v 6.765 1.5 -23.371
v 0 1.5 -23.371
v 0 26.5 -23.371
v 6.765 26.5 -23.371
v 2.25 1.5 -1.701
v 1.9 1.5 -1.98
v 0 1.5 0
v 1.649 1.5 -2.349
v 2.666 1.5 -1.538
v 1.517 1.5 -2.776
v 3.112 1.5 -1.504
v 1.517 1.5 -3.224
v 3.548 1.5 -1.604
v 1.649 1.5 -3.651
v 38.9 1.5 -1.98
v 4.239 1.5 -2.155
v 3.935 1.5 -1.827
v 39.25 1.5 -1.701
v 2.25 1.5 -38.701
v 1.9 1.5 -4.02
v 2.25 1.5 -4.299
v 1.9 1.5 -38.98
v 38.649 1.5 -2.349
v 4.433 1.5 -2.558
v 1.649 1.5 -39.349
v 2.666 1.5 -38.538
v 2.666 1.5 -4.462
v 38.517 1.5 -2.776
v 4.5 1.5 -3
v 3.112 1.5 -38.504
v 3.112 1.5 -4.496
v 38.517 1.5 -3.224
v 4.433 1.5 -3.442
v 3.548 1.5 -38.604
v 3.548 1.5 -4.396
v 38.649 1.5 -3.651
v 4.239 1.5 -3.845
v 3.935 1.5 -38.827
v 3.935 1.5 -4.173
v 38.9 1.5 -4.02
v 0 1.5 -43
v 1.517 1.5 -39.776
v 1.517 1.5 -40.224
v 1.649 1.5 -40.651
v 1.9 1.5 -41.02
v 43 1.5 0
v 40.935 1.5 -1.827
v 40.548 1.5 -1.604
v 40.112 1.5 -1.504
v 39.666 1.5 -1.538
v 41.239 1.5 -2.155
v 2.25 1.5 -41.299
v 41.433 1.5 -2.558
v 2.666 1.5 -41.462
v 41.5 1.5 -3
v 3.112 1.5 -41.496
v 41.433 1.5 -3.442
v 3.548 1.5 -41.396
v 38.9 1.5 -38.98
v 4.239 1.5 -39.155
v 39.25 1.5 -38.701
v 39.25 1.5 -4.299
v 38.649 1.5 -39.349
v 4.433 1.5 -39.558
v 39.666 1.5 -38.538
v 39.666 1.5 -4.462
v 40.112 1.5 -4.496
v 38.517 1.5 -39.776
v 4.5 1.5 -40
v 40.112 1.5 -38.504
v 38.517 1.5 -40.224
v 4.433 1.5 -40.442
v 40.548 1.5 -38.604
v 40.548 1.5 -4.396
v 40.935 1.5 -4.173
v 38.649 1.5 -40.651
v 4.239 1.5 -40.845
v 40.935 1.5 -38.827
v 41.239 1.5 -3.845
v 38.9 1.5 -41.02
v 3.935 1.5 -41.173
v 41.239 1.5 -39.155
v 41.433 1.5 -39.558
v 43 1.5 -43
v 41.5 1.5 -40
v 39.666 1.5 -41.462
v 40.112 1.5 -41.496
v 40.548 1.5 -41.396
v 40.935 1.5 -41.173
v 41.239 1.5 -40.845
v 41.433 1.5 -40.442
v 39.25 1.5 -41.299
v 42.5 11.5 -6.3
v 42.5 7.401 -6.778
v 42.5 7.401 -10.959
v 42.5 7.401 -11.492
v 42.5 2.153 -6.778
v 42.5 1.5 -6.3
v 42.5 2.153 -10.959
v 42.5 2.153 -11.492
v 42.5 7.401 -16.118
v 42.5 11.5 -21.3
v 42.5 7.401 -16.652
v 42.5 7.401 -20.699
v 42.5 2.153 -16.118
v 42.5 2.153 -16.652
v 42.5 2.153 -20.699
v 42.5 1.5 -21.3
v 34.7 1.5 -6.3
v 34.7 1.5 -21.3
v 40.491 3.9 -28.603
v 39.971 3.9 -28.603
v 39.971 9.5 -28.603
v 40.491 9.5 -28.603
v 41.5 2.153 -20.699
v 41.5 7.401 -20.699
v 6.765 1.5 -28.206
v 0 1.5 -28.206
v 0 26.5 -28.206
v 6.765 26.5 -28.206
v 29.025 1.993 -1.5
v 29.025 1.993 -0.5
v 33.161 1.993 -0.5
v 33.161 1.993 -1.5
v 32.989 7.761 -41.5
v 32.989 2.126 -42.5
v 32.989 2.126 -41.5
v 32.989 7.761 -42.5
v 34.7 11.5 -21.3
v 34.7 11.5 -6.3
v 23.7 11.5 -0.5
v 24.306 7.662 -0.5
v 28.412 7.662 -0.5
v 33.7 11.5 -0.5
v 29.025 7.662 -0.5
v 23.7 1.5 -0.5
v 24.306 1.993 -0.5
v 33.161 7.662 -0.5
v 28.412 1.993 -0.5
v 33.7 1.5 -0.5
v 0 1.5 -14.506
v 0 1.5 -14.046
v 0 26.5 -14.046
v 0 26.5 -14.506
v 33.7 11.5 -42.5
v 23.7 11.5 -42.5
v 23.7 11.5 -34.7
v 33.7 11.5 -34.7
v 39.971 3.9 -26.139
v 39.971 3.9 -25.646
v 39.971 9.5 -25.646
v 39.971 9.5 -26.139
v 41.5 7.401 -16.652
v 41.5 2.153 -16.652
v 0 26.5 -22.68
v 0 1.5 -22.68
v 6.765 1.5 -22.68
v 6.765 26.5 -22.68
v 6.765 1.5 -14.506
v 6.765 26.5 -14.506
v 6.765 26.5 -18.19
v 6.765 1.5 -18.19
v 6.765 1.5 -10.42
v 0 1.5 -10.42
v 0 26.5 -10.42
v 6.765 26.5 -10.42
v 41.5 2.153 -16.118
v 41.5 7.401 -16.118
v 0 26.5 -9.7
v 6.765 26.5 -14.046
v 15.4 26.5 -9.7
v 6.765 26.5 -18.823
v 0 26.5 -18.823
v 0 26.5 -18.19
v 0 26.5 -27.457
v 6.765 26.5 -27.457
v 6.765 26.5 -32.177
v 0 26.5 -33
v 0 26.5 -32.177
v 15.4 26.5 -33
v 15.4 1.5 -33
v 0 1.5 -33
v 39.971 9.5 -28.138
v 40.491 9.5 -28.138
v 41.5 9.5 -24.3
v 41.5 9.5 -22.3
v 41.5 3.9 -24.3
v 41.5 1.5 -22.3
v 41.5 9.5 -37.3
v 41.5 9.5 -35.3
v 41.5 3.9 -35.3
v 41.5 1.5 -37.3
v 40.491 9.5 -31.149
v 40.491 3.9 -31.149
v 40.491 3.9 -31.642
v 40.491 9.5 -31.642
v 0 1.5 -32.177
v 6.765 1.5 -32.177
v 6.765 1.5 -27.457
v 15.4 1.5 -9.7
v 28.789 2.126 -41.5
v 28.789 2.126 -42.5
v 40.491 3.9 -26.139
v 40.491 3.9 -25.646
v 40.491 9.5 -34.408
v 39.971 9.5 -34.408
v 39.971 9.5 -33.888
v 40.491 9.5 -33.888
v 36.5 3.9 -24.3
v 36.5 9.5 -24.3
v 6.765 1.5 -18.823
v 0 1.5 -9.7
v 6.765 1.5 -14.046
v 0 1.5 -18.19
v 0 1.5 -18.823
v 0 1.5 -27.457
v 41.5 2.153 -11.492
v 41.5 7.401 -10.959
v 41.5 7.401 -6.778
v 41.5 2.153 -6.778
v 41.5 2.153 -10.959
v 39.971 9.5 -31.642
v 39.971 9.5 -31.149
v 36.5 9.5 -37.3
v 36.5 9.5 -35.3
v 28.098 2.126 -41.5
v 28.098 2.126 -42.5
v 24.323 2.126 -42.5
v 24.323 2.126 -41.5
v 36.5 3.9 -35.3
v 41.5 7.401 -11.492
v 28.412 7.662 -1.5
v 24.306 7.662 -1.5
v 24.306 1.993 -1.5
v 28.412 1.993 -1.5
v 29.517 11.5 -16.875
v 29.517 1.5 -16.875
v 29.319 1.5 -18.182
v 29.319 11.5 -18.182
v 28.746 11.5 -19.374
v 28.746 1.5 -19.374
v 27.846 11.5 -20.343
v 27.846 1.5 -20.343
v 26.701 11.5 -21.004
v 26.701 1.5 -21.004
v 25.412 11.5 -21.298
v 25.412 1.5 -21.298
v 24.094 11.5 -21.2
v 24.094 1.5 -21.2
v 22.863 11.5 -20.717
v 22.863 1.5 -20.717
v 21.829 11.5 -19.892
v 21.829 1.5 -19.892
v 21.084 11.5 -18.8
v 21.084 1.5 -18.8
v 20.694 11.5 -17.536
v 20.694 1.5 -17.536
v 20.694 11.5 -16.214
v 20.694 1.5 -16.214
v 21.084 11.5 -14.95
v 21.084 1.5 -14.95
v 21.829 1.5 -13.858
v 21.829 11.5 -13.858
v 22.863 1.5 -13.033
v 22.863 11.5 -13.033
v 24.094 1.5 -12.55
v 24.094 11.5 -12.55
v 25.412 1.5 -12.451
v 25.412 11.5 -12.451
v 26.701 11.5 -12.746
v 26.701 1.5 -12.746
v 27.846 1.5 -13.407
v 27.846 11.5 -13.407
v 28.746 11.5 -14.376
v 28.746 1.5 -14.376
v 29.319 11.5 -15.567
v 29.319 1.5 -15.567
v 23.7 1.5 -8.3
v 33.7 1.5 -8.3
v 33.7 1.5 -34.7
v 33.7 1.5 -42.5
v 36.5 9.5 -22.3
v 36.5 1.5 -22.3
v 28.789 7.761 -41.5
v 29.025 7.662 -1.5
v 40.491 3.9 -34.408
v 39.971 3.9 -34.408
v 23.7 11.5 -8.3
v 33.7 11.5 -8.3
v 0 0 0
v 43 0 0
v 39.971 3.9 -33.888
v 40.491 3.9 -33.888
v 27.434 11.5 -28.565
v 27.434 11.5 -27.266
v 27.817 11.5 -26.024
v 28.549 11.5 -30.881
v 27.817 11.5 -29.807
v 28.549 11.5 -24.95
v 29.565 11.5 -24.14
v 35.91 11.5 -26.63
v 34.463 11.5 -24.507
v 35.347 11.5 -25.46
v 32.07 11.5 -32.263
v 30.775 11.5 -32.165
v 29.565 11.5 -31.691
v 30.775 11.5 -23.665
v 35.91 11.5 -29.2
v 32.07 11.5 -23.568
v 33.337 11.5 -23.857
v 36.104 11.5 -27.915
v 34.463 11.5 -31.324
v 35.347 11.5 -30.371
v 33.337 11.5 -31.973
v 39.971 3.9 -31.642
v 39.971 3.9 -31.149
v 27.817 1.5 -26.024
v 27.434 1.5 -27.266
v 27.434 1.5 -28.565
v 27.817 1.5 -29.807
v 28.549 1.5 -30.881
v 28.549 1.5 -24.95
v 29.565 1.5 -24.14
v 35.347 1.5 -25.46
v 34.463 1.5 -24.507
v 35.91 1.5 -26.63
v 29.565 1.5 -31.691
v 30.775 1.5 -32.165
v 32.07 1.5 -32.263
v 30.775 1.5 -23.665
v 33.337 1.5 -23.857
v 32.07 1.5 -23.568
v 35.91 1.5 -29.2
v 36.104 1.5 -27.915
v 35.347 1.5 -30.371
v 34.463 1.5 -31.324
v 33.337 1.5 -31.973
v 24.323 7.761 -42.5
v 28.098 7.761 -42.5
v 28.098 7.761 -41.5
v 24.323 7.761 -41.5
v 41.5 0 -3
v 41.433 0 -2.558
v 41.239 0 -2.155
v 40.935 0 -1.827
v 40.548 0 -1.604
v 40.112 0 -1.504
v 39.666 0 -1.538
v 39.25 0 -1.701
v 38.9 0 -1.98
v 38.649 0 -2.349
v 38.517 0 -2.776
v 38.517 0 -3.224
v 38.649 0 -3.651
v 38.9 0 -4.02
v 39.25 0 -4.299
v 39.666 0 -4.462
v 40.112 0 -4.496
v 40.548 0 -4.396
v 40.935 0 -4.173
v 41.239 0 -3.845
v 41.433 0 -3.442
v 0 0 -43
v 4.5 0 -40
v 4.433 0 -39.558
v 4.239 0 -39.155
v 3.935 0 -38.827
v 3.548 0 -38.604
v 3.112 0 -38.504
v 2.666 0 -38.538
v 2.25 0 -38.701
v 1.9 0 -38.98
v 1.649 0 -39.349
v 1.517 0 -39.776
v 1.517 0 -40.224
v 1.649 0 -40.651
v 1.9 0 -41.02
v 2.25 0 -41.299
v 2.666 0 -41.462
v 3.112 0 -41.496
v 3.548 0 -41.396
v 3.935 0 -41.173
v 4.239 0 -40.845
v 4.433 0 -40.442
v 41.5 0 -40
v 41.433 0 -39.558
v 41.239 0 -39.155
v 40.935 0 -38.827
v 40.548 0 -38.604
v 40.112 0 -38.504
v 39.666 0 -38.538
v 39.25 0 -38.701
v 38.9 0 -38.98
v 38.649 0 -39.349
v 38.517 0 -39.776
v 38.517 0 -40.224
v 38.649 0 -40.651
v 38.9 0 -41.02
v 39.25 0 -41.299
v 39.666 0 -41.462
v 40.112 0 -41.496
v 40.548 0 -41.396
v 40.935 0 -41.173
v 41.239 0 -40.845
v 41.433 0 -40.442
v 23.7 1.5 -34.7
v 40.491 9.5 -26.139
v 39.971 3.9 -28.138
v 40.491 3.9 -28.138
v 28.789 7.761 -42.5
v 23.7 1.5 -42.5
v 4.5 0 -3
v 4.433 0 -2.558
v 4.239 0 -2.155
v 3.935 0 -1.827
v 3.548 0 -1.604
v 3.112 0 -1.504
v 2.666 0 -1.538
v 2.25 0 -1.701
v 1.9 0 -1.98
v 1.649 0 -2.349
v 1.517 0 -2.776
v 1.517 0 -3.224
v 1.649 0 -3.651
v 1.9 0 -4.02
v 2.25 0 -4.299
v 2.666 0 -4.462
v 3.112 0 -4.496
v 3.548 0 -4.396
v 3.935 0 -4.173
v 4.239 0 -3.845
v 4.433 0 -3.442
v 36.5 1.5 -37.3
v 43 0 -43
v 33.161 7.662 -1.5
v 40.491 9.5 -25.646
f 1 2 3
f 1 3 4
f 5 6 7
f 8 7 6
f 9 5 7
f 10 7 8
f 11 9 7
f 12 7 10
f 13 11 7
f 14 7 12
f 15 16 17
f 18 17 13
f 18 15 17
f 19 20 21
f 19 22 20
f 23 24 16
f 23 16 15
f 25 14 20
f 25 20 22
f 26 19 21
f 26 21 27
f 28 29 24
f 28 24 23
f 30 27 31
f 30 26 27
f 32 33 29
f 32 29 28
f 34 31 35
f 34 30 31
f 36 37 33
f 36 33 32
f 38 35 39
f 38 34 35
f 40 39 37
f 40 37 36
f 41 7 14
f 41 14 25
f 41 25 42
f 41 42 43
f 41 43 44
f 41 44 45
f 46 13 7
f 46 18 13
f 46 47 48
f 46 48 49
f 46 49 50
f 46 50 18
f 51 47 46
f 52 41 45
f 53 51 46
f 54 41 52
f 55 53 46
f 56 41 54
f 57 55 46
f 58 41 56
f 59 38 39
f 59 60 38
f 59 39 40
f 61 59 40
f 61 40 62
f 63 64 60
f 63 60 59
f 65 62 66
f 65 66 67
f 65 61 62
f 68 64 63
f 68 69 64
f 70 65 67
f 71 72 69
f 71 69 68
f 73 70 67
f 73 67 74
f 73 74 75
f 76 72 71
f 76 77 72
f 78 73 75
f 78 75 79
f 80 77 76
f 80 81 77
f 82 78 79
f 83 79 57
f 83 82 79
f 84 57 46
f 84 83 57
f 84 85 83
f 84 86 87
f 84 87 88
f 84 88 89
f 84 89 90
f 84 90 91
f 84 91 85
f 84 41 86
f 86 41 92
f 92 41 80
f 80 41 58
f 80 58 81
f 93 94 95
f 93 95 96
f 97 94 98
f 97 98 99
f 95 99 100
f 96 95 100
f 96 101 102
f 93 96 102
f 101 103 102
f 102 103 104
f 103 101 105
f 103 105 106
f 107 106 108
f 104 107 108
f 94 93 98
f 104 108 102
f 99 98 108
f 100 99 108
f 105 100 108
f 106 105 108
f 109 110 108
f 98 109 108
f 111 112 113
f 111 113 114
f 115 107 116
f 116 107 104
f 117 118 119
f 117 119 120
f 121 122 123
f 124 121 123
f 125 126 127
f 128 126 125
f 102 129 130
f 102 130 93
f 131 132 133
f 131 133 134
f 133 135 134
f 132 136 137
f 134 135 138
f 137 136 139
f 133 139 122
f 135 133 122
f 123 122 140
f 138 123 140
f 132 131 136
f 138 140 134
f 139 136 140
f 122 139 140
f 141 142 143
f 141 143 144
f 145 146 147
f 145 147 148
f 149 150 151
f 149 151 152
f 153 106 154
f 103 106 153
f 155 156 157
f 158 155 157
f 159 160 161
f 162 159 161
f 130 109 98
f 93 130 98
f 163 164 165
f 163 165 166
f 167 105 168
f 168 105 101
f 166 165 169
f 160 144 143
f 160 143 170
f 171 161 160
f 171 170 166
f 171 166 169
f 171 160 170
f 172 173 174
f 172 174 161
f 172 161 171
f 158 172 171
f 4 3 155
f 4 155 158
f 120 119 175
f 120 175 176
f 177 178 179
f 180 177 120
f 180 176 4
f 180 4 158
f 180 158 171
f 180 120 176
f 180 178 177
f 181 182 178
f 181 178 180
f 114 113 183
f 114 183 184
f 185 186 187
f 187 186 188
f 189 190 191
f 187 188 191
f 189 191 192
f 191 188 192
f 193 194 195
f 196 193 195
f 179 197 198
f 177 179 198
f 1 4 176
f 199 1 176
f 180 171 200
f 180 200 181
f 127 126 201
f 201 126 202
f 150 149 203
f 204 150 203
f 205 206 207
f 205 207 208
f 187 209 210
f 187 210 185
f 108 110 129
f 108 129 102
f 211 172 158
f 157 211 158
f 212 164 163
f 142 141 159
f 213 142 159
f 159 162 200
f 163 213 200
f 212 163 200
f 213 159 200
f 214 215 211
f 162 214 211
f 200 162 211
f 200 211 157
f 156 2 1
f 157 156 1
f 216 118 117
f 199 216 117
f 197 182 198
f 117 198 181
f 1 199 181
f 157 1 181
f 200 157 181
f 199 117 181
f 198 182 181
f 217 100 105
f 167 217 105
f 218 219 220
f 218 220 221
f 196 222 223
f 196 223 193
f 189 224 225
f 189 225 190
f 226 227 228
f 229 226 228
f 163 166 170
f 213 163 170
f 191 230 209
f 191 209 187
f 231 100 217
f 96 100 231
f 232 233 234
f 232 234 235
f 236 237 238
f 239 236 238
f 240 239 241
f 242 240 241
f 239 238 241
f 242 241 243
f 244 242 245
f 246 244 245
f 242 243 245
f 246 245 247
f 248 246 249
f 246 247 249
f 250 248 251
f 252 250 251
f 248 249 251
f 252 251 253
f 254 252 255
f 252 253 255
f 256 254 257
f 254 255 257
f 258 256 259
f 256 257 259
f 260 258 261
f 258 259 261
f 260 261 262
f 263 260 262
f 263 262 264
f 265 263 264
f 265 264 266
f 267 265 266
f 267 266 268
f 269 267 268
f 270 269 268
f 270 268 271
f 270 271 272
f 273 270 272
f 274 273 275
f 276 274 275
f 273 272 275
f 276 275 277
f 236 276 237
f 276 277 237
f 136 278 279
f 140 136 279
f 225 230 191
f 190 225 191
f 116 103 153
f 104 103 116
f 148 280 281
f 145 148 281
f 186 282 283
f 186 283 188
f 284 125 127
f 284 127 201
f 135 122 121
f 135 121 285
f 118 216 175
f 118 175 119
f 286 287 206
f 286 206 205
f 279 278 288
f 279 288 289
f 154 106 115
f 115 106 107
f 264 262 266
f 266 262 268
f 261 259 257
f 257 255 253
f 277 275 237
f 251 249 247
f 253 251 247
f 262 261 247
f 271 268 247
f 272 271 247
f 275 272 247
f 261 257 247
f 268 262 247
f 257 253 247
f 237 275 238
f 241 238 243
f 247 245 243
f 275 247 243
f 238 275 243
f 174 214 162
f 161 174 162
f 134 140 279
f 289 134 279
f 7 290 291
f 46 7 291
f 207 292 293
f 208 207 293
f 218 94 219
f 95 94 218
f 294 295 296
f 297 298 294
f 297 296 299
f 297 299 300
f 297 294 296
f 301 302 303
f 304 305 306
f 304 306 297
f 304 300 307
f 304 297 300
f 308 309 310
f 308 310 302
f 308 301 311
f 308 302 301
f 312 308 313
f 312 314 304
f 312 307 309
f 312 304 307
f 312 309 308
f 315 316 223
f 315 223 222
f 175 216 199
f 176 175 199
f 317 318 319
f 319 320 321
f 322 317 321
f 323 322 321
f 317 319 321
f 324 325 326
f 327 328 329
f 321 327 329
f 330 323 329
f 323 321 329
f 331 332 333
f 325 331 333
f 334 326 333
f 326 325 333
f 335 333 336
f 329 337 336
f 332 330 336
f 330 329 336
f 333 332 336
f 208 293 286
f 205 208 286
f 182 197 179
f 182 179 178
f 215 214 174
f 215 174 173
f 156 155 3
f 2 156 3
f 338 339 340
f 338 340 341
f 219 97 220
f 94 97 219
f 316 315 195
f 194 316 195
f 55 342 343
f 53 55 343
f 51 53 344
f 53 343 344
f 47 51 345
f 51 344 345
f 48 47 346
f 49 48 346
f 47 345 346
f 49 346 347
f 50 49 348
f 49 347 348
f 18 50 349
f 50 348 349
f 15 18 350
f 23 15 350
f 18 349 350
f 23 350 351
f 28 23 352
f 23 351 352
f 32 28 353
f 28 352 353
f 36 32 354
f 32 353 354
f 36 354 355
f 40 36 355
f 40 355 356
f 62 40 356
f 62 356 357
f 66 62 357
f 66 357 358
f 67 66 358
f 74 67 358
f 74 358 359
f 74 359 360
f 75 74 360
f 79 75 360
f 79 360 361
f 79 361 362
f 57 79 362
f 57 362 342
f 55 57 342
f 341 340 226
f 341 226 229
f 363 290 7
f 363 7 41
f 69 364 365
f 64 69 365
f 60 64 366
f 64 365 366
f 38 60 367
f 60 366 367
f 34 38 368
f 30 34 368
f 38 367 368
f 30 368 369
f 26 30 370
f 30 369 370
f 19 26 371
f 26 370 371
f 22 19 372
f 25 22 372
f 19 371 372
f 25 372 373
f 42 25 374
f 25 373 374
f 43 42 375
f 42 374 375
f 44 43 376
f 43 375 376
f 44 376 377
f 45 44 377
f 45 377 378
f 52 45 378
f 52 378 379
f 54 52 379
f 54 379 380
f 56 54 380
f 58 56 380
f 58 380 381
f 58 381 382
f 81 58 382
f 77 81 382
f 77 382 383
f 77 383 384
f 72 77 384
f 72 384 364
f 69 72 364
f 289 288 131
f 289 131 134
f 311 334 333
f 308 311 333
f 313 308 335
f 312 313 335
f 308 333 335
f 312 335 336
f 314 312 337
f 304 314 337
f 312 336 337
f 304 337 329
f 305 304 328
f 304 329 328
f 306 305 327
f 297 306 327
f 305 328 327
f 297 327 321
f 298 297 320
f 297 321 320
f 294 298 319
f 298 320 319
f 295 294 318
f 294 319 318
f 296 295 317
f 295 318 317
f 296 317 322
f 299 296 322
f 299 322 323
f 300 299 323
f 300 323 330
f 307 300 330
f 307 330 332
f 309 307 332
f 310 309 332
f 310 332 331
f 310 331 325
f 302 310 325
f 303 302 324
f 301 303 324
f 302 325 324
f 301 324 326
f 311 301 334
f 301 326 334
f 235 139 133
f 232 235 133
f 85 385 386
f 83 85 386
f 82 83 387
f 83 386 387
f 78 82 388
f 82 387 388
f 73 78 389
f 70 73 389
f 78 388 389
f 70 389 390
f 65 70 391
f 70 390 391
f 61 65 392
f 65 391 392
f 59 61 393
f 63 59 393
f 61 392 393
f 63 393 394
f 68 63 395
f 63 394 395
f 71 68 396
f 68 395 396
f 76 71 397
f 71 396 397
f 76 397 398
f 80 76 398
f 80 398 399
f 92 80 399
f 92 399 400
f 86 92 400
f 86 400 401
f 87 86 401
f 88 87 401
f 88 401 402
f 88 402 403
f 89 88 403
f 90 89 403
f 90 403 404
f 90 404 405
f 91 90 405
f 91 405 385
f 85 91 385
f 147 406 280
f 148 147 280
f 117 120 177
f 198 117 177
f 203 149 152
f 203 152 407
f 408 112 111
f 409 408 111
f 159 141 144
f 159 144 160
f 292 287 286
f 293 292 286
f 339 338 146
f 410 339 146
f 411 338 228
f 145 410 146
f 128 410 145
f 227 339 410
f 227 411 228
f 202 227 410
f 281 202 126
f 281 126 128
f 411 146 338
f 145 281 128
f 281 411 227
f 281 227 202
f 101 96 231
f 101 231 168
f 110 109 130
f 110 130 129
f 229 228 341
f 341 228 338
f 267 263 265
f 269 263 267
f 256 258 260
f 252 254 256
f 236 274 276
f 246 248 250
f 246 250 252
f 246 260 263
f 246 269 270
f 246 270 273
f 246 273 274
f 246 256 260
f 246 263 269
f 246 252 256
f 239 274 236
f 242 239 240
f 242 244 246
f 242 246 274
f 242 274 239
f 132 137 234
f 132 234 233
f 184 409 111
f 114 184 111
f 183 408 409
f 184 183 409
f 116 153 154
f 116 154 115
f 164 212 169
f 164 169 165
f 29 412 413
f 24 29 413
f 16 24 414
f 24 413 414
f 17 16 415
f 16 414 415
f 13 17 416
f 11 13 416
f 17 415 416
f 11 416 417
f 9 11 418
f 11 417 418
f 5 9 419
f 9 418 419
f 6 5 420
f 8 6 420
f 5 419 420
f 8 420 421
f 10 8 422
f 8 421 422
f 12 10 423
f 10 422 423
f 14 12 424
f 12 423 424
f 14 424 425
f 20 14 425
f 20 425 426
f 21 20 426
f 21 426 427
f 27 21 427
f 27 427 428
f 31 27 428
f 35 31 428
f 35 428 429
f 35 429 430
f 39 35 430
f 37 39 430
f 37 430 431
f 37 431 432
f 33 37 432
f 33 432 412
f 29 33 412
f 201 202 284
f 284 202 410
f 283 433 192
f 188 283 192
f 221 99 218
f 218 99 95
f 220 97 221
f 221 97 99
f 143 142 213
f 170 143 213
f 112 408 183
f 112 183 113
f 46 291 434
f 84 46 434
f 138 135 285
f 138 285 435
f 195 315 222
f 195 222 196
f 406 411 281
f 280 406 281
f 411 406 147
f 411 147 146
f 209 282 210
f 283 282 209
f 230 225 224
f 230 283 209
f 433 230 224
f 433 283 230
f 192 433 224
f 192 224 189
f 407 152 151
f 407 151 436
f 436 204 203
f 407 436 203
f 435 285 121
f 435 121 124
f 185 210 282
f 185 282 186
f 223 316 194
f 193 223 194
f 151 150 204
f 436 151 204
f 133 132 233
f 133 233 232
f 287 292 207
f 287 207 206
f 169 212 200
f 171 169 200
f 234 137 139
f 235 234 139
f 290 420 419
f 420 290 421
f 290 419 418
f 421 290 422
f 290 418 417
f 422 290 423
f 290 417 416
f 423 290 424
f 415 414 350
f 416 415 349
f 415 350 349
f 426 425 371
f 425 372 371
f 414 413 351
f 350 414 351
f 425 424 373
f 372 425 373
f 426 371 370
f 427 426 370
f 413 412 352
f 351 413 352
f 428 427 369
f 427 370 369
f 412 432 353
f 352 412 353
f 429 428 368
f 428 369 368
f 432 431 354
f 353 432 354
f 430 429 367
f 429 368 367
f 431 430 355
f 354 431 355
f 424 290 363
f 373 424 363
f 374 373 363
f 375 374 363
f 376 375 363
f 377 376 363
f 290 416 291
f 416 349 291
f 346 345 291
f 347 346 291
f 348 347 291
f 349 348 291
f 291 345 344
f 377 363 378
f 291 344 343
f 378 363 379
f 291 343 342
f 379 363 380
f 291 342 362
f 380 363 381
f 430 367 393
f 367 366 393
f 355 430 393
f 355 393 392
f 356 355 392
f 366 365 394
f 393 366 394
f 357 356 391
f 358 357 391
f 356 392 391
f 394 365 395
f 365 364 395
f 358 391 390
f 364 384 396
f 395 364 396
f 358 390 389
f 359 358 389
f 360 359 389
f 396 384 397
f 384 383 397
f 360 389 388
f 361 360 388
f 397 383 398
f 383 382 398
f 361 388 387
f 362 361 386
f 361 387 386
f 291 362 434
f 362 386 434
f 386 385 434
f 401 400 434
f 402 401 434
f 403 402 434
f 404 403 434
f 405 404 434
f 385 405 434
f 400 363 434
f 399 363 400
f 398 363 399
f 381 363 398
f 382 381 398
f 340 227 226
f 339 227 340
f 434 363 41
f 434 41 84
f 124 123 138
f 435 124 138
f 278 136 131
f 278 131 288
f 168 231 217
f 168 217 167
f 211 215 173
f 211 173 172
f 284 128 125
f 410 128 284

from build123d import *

# Parameters (mm, degrees)
SKETCH_1_W          = 43
SKETCH_1_H          = 43
EXTRUDE_1_DEPTH     = 1.5
SKETCH_2_W          = 7.8
SKETCH_2_H          = 15
EXTRUDE_2_DEPTH     = 10
SKETCH_2_W_2        = 10
SKETCH_2_H_2        = 7.8
EXTRUDE_2_2_DEPTH   = 10
EXTRUDE_2_3_DEPTH   = 10
SKETCH_3_W          = 15.4
SKETCH_3_H          = 23.3
EXTRUDE_3_DEPTH     = 25
SKETCH_4_W          = 6.764705707
SKETCH_4_H          = 3.97162229
SKETCH_4_H_2        = 4.086741777
SKETCH_4_H_3        = 3.856502803
SKETCH_4_H_4        = 3.683823573
SKETCH_4_H_5        = 3.626263829
CUT_EXTRUDE_1_DEPTH = 25
SKETCH_5_R          = 4.359395477
EXTRUDE_4_DEPTH     = 10
SKETCH_5_R_2        = 4.435881934
EXTRUDE_4_2_DEPTH   = 10
SKETCH_6_W          = 4.180930447
SKETCH_6_H          = 5.248402051
SKETCH_6_W_2        = 4.625710282
SKETCH_6_W_3        = 4.047496497
CUT_EXTRUDE_2_DEPTH = 1
SKETCH_8_W          = 4.105878298
SKETCH_8_H          = 5.668563322
SKETCH_8_W_2        = 4.136519181
CUT_EXTRUDE_3_DEPTH = 1
SKETCH_9_W          = 4.199646783
SKETCH_9_H          = 5.634969101
SKETCH_9_W_2        = 3.774366096
CUT_EXTRUDE_4_DEPTH = 1
SKETCH_10_R         = 1.5
CUT_EXTRUDE_5_DEPTH = 3
SKETCH_11_W         = 5
SKETCH_11_H         = 15
EXTRUDE_5_DEPTH     = 2.4
SKETCH_12_W         = 5
SKETCH_12_H         = 2
EXTRUDE_6_DEPTH     = 5.6
SKETCH_13_W         = 0.520232118
SKETCH_13_H         = 0.520232118
EXTRUDE_7_DEPTH     = 5.6
SKETCH_13_H_2       = 0.492851481
EXTRUDE_7_2_DEPTH   = 5.6
SKETCH_13_H_3       = 0.465470842
EXTRUDE_7_3_DEPTH   = 5.6
SKETCH_13_H_4       = 0.49285148
EXTRUDE_7_4_DEPTH   = 5.6


with BuildPart() as part:
    # 草圖1 → 填料-伸長1 (new body)
    with BuildSketch(Plane(origin=(0, 0, 0), x_dir=(1, 0, 0), z_dir=(0, 1, 0))):
        with Locations((21.5, 21.5)):
            Rectangle(SKETCH_1_W, SKETCH_1_H)
    extrude(amount=EXTRUDE_1_DEPTH)

    # 草圖10 → 除料-伸長5 (cut)
    with BuildSketch(Plane.XZ):
        with Locations((40, -3)):
            Circle(SKETCH_10_R)
        with Locations((3, -3)):
            Circle(SKETCH_10_R)
        with Locations((3, -40)):
            Circle(SKETCH_10_R)
        with Locations((40, -40)):
            Circle(SKETCH_10_R)
    extrude(amount=-CUT_EXTRUDE_5_DEPTH, mode=Mode.SUBTRACT)


with BuildPart() as body_2:
    # 草圖2 → 填料-伸長2 (new body)
    with BuildSketch(Plane(origin=(0, 1.5, 0), x_dir=(1, 0, 0), z_dir=(0, 1, 0))):
        with Locations((38.6, 13.8)):
            Rectangle(SKETCH_2_W, SKETCH_2_H)
    extrude(amount=EXTRUDE_2_DEPTH)

    # 草圖6 → 除料-伸長2 (cut)
    with BuildSketch(Plane(origin=(42.5, 0, 0), x_dir=(0, 0, -1), z_dir=(1, 0, 0))):
        with Locations((8.868252691, 4.776944146)):
            Rectangle(SKETCH_6_W, SKETCH_6_H)
        with Locations((13.805308857, 4.776944146)):
            Rectangle(SKETCH_6_W_2, SKETCH_6_H)
        with Locations((18.675648049, 4.776944146)):
            Rectangle(SKETCH_6_W_3, SKETCH_6_H)
    extrude(amount=-CUT_EXTRUDE_2_DEPTH, mode=Mode.SUBTRACT)


with BuildPart() as body_3:
    # 草圖2 → Extrude 2 2 (new body)
    with BuildSketch(Plane(origin=(0, 1.5, 0), x_dir=(1, 0, 0), z_dir=(0, 1, 0))):
        with Locations((28.7, 4.4)):
            Rectangle(SKETCH_2_W_2, SKETCH_2_H_2)
    extrude(amount=EXTRUDE_2_2_DEPTH)

    # 草圖8 → 除料-伸長3 (cut)
    with BuildSketch(Plane.XY.offset(-0.5)):
        with Locations((26.358920359, 4.827651605)):
            Rectangle(SKETCH_8_W, SKETCH_8_H)
        with Locations((31.092936755, 4.827651605)):
            Rectangle(SKETCH_8_W_2, SKETCH_8_H)
    extrude(amount=-CUT_EXTRUDE_3_DEPTH, mode=Mode.SUBTRACT)


with BuildPart() as body_4:
    # 草圖2 → Extrude 2 3 (new body)
    with BuildSketch(Plane(origin=(0, 1.5, 0), x_dir=(1, 0, 0), z_dir=(0, 1, 0))):
        with Locations((28.7, 38.6)):
            Rectangle(SKETCH_2_W_2, SKETCH_2_H_2)
    extrude(amount=EXTRUDE_2_3_DEPTH)

    # 草圖9 → 除料-伸長4 (cut)
    with BuildSketch(Plane(origin=(0, 0, -42.5), x_dir=(-1, 0, 0), z_dir=(0, 0, -1))):
        with Locations((-30.888679621, 4.943816645)):
            Rectangle(SKETCH_9_W, SKETCH_9_H)
        with Locations((-26.210592066, 4.943816645)):
            Rectangle(SKETCH_9_W_2, SKETCH_9_H)
    extrude(amount=-CUT_EXTRUDE_4_DEPTH, mode=Mode.SUBTRACT)


with BuildPart() as body_5:
    # 草圖3 → 填料-伸長3 (new body)
    with BuildSketch(Plane(origin=(0, 1.5, 0), x_dir=(1, 0, 0), z_dir=(0, 1, 0))):
        with Locations((7.7, 21.35)):
            Rectangle(SKETCH_3_W, SKETCH_3_H)
    extrude(amount=EXTRUDE_3_DEPTH)

    # 草圖4 → 除料-伸長1 (cut)
    with BuildSketch(Plane(origin=(0, 26.5, 0), x_dir=(1, 0, 0), z_dir=(0, 1, 0))):
        with Locations((3.382352854, 30.191521243)):
            Rectangle(SKETCH_4_W, SKETCH_4_H)
        with Locations((3.382352854, 25.414062547)):
            Rectangle(SKETCH_4_W, SKETCH_4_H_2)
        with Locations((3.382352854, 20.751723336)):
            Rectangle(SKETCH_4_W, SKETCH_4_H_3)
        with Locations((3.382352854, 16.348402972)):
            Rectangle(SKETCH_4_W, SKETCH_4_H_4)
        with Locations((3.382352854, 12.232881324)):
            Rectangle(SKETCH_4_W, SKETCH_4_H_5)
    extrude(amount=-CUT_EXTRUDE_1_DEPTH, mode=Mode.SUBTRACT)


with BuildPart() as body_6:
    # 草圖5 → 填料-伸長4 (new body)
    with BuildSketch(Plane(origin=(0, 1.5, 0), x_dir=(1, 0, 0), z_dir=(0, 1, 0))):
        with Locations((31.744713357, 27.915378753)):
            Circle(SKETCH_5_R)
    extrude(amount=EXTRUDE_4_DEPTH)


with BuildPart() as body_7:
    # 草圖5 → Extrude 4 2 (new body)
    with BuildSketch(Plane(origin=(0, 1.5, 0), x_dir=(1, 0, 0), z_dir=(0, 1, 0))):
        with Locations((25.080676513, 16.874959504)):
            Circle(SKETCH_5_R_2)
    extrude(amount=EXTRUDE_4_2_DEPTH)


with BuildPart() as body_8:
    # 草圖11 → 填料-伸長5 (new body)
    with BuildSketch(Plane(origin=(0, 1.5, 0), x_dir=(1, 0, 0), z_dir=(0, 1, 0))):
        with Locations((39, 29.8)):
            Rectangle(SKETCH_11_W, SKETCH_11_H)
    extrude(amount=EXTRUDE_5_DEPTH)

    # 草圖12 → 填料-伸長6 (add)
    with BuildSketch(Plane(origin=(0, 3.9, 0), x_dir=(1, 0, 0), z_dir=(0, 1, 0))):
        with Locations((39, 36.3)):
            Rectangle(SKETCH_12_W, SKETCH_12_H)
        with Locations((39, 23.3)):
            Rectangle(SKETCH_12_W, SKETCH_12_H)
    extrude(amount=EXTRUDE_6_DEPTH)


with BuildPart() as body_9:
    # 草圖13 → 填料-伸長7 (new body)
    with BuildSketch(Plane(origin=(0, 3.9, 0), x_dir=(1, 0, 0), z_dir=(0, 1, 0))):
        with Locations((40.230628725, 34.147639552)):
            Rectangle(SKETCH_13_W, SKETCH_13_H)
    extrude(amount=EXTRUDE_7_DEPTH)


with BuildPart() as body_10:
    # 草圖13 → Extrude 7 2 (new body)
    with BuildSketch(Plane(origin=(0, 3.9, 0), x_dir=(1, 0, 0), z_dir=(0, 1, 0))):
        with Locations((40.230628725, 31.395885455)):
            Rectangle(SKETCH_13_W, SKETCH_13_H_2)
    extrude(amount=EXTRUDE_7_2_DEPTH)


with BuildPart() as body_11:
    # 草圖13 → Extrude 7 3 (new body)
    with BuildSketch(Plane(origin=(0, 3.9, 0), x_dir=(1, 0, 0), z_dir=(0, 1, 0))):
        with Locations((40.230628725, 28.370324979)):
            Rectangle(SKETCH_13_W, SKETCH_13_H_3)
    extrude(amount=EXTRUDE_7_3_DEPTH)


with BuildPart() as body_12:
    # 草圖13 → Extrude 7 4 (new body)
    with BuildSketch(Plane(origin=(0, 3.9, 0), x_dir=(1, 0, 0), z_dir=(0, 1, 0))):
        with Locations((40.230628725, 25.892377259)):
            Rectangle(SKETCH_13_W, SKETCH_13_H_4)
    extrude(amount=EXTRUDE_7_4_DEPTH)


solid = Compound([part.part, body_2.part, body_3.part, body_4.part, body_5.part, body_6.part, body_7.part, body_8.part, body_9.part, body_10.part, body_11.part, body_12.part])
